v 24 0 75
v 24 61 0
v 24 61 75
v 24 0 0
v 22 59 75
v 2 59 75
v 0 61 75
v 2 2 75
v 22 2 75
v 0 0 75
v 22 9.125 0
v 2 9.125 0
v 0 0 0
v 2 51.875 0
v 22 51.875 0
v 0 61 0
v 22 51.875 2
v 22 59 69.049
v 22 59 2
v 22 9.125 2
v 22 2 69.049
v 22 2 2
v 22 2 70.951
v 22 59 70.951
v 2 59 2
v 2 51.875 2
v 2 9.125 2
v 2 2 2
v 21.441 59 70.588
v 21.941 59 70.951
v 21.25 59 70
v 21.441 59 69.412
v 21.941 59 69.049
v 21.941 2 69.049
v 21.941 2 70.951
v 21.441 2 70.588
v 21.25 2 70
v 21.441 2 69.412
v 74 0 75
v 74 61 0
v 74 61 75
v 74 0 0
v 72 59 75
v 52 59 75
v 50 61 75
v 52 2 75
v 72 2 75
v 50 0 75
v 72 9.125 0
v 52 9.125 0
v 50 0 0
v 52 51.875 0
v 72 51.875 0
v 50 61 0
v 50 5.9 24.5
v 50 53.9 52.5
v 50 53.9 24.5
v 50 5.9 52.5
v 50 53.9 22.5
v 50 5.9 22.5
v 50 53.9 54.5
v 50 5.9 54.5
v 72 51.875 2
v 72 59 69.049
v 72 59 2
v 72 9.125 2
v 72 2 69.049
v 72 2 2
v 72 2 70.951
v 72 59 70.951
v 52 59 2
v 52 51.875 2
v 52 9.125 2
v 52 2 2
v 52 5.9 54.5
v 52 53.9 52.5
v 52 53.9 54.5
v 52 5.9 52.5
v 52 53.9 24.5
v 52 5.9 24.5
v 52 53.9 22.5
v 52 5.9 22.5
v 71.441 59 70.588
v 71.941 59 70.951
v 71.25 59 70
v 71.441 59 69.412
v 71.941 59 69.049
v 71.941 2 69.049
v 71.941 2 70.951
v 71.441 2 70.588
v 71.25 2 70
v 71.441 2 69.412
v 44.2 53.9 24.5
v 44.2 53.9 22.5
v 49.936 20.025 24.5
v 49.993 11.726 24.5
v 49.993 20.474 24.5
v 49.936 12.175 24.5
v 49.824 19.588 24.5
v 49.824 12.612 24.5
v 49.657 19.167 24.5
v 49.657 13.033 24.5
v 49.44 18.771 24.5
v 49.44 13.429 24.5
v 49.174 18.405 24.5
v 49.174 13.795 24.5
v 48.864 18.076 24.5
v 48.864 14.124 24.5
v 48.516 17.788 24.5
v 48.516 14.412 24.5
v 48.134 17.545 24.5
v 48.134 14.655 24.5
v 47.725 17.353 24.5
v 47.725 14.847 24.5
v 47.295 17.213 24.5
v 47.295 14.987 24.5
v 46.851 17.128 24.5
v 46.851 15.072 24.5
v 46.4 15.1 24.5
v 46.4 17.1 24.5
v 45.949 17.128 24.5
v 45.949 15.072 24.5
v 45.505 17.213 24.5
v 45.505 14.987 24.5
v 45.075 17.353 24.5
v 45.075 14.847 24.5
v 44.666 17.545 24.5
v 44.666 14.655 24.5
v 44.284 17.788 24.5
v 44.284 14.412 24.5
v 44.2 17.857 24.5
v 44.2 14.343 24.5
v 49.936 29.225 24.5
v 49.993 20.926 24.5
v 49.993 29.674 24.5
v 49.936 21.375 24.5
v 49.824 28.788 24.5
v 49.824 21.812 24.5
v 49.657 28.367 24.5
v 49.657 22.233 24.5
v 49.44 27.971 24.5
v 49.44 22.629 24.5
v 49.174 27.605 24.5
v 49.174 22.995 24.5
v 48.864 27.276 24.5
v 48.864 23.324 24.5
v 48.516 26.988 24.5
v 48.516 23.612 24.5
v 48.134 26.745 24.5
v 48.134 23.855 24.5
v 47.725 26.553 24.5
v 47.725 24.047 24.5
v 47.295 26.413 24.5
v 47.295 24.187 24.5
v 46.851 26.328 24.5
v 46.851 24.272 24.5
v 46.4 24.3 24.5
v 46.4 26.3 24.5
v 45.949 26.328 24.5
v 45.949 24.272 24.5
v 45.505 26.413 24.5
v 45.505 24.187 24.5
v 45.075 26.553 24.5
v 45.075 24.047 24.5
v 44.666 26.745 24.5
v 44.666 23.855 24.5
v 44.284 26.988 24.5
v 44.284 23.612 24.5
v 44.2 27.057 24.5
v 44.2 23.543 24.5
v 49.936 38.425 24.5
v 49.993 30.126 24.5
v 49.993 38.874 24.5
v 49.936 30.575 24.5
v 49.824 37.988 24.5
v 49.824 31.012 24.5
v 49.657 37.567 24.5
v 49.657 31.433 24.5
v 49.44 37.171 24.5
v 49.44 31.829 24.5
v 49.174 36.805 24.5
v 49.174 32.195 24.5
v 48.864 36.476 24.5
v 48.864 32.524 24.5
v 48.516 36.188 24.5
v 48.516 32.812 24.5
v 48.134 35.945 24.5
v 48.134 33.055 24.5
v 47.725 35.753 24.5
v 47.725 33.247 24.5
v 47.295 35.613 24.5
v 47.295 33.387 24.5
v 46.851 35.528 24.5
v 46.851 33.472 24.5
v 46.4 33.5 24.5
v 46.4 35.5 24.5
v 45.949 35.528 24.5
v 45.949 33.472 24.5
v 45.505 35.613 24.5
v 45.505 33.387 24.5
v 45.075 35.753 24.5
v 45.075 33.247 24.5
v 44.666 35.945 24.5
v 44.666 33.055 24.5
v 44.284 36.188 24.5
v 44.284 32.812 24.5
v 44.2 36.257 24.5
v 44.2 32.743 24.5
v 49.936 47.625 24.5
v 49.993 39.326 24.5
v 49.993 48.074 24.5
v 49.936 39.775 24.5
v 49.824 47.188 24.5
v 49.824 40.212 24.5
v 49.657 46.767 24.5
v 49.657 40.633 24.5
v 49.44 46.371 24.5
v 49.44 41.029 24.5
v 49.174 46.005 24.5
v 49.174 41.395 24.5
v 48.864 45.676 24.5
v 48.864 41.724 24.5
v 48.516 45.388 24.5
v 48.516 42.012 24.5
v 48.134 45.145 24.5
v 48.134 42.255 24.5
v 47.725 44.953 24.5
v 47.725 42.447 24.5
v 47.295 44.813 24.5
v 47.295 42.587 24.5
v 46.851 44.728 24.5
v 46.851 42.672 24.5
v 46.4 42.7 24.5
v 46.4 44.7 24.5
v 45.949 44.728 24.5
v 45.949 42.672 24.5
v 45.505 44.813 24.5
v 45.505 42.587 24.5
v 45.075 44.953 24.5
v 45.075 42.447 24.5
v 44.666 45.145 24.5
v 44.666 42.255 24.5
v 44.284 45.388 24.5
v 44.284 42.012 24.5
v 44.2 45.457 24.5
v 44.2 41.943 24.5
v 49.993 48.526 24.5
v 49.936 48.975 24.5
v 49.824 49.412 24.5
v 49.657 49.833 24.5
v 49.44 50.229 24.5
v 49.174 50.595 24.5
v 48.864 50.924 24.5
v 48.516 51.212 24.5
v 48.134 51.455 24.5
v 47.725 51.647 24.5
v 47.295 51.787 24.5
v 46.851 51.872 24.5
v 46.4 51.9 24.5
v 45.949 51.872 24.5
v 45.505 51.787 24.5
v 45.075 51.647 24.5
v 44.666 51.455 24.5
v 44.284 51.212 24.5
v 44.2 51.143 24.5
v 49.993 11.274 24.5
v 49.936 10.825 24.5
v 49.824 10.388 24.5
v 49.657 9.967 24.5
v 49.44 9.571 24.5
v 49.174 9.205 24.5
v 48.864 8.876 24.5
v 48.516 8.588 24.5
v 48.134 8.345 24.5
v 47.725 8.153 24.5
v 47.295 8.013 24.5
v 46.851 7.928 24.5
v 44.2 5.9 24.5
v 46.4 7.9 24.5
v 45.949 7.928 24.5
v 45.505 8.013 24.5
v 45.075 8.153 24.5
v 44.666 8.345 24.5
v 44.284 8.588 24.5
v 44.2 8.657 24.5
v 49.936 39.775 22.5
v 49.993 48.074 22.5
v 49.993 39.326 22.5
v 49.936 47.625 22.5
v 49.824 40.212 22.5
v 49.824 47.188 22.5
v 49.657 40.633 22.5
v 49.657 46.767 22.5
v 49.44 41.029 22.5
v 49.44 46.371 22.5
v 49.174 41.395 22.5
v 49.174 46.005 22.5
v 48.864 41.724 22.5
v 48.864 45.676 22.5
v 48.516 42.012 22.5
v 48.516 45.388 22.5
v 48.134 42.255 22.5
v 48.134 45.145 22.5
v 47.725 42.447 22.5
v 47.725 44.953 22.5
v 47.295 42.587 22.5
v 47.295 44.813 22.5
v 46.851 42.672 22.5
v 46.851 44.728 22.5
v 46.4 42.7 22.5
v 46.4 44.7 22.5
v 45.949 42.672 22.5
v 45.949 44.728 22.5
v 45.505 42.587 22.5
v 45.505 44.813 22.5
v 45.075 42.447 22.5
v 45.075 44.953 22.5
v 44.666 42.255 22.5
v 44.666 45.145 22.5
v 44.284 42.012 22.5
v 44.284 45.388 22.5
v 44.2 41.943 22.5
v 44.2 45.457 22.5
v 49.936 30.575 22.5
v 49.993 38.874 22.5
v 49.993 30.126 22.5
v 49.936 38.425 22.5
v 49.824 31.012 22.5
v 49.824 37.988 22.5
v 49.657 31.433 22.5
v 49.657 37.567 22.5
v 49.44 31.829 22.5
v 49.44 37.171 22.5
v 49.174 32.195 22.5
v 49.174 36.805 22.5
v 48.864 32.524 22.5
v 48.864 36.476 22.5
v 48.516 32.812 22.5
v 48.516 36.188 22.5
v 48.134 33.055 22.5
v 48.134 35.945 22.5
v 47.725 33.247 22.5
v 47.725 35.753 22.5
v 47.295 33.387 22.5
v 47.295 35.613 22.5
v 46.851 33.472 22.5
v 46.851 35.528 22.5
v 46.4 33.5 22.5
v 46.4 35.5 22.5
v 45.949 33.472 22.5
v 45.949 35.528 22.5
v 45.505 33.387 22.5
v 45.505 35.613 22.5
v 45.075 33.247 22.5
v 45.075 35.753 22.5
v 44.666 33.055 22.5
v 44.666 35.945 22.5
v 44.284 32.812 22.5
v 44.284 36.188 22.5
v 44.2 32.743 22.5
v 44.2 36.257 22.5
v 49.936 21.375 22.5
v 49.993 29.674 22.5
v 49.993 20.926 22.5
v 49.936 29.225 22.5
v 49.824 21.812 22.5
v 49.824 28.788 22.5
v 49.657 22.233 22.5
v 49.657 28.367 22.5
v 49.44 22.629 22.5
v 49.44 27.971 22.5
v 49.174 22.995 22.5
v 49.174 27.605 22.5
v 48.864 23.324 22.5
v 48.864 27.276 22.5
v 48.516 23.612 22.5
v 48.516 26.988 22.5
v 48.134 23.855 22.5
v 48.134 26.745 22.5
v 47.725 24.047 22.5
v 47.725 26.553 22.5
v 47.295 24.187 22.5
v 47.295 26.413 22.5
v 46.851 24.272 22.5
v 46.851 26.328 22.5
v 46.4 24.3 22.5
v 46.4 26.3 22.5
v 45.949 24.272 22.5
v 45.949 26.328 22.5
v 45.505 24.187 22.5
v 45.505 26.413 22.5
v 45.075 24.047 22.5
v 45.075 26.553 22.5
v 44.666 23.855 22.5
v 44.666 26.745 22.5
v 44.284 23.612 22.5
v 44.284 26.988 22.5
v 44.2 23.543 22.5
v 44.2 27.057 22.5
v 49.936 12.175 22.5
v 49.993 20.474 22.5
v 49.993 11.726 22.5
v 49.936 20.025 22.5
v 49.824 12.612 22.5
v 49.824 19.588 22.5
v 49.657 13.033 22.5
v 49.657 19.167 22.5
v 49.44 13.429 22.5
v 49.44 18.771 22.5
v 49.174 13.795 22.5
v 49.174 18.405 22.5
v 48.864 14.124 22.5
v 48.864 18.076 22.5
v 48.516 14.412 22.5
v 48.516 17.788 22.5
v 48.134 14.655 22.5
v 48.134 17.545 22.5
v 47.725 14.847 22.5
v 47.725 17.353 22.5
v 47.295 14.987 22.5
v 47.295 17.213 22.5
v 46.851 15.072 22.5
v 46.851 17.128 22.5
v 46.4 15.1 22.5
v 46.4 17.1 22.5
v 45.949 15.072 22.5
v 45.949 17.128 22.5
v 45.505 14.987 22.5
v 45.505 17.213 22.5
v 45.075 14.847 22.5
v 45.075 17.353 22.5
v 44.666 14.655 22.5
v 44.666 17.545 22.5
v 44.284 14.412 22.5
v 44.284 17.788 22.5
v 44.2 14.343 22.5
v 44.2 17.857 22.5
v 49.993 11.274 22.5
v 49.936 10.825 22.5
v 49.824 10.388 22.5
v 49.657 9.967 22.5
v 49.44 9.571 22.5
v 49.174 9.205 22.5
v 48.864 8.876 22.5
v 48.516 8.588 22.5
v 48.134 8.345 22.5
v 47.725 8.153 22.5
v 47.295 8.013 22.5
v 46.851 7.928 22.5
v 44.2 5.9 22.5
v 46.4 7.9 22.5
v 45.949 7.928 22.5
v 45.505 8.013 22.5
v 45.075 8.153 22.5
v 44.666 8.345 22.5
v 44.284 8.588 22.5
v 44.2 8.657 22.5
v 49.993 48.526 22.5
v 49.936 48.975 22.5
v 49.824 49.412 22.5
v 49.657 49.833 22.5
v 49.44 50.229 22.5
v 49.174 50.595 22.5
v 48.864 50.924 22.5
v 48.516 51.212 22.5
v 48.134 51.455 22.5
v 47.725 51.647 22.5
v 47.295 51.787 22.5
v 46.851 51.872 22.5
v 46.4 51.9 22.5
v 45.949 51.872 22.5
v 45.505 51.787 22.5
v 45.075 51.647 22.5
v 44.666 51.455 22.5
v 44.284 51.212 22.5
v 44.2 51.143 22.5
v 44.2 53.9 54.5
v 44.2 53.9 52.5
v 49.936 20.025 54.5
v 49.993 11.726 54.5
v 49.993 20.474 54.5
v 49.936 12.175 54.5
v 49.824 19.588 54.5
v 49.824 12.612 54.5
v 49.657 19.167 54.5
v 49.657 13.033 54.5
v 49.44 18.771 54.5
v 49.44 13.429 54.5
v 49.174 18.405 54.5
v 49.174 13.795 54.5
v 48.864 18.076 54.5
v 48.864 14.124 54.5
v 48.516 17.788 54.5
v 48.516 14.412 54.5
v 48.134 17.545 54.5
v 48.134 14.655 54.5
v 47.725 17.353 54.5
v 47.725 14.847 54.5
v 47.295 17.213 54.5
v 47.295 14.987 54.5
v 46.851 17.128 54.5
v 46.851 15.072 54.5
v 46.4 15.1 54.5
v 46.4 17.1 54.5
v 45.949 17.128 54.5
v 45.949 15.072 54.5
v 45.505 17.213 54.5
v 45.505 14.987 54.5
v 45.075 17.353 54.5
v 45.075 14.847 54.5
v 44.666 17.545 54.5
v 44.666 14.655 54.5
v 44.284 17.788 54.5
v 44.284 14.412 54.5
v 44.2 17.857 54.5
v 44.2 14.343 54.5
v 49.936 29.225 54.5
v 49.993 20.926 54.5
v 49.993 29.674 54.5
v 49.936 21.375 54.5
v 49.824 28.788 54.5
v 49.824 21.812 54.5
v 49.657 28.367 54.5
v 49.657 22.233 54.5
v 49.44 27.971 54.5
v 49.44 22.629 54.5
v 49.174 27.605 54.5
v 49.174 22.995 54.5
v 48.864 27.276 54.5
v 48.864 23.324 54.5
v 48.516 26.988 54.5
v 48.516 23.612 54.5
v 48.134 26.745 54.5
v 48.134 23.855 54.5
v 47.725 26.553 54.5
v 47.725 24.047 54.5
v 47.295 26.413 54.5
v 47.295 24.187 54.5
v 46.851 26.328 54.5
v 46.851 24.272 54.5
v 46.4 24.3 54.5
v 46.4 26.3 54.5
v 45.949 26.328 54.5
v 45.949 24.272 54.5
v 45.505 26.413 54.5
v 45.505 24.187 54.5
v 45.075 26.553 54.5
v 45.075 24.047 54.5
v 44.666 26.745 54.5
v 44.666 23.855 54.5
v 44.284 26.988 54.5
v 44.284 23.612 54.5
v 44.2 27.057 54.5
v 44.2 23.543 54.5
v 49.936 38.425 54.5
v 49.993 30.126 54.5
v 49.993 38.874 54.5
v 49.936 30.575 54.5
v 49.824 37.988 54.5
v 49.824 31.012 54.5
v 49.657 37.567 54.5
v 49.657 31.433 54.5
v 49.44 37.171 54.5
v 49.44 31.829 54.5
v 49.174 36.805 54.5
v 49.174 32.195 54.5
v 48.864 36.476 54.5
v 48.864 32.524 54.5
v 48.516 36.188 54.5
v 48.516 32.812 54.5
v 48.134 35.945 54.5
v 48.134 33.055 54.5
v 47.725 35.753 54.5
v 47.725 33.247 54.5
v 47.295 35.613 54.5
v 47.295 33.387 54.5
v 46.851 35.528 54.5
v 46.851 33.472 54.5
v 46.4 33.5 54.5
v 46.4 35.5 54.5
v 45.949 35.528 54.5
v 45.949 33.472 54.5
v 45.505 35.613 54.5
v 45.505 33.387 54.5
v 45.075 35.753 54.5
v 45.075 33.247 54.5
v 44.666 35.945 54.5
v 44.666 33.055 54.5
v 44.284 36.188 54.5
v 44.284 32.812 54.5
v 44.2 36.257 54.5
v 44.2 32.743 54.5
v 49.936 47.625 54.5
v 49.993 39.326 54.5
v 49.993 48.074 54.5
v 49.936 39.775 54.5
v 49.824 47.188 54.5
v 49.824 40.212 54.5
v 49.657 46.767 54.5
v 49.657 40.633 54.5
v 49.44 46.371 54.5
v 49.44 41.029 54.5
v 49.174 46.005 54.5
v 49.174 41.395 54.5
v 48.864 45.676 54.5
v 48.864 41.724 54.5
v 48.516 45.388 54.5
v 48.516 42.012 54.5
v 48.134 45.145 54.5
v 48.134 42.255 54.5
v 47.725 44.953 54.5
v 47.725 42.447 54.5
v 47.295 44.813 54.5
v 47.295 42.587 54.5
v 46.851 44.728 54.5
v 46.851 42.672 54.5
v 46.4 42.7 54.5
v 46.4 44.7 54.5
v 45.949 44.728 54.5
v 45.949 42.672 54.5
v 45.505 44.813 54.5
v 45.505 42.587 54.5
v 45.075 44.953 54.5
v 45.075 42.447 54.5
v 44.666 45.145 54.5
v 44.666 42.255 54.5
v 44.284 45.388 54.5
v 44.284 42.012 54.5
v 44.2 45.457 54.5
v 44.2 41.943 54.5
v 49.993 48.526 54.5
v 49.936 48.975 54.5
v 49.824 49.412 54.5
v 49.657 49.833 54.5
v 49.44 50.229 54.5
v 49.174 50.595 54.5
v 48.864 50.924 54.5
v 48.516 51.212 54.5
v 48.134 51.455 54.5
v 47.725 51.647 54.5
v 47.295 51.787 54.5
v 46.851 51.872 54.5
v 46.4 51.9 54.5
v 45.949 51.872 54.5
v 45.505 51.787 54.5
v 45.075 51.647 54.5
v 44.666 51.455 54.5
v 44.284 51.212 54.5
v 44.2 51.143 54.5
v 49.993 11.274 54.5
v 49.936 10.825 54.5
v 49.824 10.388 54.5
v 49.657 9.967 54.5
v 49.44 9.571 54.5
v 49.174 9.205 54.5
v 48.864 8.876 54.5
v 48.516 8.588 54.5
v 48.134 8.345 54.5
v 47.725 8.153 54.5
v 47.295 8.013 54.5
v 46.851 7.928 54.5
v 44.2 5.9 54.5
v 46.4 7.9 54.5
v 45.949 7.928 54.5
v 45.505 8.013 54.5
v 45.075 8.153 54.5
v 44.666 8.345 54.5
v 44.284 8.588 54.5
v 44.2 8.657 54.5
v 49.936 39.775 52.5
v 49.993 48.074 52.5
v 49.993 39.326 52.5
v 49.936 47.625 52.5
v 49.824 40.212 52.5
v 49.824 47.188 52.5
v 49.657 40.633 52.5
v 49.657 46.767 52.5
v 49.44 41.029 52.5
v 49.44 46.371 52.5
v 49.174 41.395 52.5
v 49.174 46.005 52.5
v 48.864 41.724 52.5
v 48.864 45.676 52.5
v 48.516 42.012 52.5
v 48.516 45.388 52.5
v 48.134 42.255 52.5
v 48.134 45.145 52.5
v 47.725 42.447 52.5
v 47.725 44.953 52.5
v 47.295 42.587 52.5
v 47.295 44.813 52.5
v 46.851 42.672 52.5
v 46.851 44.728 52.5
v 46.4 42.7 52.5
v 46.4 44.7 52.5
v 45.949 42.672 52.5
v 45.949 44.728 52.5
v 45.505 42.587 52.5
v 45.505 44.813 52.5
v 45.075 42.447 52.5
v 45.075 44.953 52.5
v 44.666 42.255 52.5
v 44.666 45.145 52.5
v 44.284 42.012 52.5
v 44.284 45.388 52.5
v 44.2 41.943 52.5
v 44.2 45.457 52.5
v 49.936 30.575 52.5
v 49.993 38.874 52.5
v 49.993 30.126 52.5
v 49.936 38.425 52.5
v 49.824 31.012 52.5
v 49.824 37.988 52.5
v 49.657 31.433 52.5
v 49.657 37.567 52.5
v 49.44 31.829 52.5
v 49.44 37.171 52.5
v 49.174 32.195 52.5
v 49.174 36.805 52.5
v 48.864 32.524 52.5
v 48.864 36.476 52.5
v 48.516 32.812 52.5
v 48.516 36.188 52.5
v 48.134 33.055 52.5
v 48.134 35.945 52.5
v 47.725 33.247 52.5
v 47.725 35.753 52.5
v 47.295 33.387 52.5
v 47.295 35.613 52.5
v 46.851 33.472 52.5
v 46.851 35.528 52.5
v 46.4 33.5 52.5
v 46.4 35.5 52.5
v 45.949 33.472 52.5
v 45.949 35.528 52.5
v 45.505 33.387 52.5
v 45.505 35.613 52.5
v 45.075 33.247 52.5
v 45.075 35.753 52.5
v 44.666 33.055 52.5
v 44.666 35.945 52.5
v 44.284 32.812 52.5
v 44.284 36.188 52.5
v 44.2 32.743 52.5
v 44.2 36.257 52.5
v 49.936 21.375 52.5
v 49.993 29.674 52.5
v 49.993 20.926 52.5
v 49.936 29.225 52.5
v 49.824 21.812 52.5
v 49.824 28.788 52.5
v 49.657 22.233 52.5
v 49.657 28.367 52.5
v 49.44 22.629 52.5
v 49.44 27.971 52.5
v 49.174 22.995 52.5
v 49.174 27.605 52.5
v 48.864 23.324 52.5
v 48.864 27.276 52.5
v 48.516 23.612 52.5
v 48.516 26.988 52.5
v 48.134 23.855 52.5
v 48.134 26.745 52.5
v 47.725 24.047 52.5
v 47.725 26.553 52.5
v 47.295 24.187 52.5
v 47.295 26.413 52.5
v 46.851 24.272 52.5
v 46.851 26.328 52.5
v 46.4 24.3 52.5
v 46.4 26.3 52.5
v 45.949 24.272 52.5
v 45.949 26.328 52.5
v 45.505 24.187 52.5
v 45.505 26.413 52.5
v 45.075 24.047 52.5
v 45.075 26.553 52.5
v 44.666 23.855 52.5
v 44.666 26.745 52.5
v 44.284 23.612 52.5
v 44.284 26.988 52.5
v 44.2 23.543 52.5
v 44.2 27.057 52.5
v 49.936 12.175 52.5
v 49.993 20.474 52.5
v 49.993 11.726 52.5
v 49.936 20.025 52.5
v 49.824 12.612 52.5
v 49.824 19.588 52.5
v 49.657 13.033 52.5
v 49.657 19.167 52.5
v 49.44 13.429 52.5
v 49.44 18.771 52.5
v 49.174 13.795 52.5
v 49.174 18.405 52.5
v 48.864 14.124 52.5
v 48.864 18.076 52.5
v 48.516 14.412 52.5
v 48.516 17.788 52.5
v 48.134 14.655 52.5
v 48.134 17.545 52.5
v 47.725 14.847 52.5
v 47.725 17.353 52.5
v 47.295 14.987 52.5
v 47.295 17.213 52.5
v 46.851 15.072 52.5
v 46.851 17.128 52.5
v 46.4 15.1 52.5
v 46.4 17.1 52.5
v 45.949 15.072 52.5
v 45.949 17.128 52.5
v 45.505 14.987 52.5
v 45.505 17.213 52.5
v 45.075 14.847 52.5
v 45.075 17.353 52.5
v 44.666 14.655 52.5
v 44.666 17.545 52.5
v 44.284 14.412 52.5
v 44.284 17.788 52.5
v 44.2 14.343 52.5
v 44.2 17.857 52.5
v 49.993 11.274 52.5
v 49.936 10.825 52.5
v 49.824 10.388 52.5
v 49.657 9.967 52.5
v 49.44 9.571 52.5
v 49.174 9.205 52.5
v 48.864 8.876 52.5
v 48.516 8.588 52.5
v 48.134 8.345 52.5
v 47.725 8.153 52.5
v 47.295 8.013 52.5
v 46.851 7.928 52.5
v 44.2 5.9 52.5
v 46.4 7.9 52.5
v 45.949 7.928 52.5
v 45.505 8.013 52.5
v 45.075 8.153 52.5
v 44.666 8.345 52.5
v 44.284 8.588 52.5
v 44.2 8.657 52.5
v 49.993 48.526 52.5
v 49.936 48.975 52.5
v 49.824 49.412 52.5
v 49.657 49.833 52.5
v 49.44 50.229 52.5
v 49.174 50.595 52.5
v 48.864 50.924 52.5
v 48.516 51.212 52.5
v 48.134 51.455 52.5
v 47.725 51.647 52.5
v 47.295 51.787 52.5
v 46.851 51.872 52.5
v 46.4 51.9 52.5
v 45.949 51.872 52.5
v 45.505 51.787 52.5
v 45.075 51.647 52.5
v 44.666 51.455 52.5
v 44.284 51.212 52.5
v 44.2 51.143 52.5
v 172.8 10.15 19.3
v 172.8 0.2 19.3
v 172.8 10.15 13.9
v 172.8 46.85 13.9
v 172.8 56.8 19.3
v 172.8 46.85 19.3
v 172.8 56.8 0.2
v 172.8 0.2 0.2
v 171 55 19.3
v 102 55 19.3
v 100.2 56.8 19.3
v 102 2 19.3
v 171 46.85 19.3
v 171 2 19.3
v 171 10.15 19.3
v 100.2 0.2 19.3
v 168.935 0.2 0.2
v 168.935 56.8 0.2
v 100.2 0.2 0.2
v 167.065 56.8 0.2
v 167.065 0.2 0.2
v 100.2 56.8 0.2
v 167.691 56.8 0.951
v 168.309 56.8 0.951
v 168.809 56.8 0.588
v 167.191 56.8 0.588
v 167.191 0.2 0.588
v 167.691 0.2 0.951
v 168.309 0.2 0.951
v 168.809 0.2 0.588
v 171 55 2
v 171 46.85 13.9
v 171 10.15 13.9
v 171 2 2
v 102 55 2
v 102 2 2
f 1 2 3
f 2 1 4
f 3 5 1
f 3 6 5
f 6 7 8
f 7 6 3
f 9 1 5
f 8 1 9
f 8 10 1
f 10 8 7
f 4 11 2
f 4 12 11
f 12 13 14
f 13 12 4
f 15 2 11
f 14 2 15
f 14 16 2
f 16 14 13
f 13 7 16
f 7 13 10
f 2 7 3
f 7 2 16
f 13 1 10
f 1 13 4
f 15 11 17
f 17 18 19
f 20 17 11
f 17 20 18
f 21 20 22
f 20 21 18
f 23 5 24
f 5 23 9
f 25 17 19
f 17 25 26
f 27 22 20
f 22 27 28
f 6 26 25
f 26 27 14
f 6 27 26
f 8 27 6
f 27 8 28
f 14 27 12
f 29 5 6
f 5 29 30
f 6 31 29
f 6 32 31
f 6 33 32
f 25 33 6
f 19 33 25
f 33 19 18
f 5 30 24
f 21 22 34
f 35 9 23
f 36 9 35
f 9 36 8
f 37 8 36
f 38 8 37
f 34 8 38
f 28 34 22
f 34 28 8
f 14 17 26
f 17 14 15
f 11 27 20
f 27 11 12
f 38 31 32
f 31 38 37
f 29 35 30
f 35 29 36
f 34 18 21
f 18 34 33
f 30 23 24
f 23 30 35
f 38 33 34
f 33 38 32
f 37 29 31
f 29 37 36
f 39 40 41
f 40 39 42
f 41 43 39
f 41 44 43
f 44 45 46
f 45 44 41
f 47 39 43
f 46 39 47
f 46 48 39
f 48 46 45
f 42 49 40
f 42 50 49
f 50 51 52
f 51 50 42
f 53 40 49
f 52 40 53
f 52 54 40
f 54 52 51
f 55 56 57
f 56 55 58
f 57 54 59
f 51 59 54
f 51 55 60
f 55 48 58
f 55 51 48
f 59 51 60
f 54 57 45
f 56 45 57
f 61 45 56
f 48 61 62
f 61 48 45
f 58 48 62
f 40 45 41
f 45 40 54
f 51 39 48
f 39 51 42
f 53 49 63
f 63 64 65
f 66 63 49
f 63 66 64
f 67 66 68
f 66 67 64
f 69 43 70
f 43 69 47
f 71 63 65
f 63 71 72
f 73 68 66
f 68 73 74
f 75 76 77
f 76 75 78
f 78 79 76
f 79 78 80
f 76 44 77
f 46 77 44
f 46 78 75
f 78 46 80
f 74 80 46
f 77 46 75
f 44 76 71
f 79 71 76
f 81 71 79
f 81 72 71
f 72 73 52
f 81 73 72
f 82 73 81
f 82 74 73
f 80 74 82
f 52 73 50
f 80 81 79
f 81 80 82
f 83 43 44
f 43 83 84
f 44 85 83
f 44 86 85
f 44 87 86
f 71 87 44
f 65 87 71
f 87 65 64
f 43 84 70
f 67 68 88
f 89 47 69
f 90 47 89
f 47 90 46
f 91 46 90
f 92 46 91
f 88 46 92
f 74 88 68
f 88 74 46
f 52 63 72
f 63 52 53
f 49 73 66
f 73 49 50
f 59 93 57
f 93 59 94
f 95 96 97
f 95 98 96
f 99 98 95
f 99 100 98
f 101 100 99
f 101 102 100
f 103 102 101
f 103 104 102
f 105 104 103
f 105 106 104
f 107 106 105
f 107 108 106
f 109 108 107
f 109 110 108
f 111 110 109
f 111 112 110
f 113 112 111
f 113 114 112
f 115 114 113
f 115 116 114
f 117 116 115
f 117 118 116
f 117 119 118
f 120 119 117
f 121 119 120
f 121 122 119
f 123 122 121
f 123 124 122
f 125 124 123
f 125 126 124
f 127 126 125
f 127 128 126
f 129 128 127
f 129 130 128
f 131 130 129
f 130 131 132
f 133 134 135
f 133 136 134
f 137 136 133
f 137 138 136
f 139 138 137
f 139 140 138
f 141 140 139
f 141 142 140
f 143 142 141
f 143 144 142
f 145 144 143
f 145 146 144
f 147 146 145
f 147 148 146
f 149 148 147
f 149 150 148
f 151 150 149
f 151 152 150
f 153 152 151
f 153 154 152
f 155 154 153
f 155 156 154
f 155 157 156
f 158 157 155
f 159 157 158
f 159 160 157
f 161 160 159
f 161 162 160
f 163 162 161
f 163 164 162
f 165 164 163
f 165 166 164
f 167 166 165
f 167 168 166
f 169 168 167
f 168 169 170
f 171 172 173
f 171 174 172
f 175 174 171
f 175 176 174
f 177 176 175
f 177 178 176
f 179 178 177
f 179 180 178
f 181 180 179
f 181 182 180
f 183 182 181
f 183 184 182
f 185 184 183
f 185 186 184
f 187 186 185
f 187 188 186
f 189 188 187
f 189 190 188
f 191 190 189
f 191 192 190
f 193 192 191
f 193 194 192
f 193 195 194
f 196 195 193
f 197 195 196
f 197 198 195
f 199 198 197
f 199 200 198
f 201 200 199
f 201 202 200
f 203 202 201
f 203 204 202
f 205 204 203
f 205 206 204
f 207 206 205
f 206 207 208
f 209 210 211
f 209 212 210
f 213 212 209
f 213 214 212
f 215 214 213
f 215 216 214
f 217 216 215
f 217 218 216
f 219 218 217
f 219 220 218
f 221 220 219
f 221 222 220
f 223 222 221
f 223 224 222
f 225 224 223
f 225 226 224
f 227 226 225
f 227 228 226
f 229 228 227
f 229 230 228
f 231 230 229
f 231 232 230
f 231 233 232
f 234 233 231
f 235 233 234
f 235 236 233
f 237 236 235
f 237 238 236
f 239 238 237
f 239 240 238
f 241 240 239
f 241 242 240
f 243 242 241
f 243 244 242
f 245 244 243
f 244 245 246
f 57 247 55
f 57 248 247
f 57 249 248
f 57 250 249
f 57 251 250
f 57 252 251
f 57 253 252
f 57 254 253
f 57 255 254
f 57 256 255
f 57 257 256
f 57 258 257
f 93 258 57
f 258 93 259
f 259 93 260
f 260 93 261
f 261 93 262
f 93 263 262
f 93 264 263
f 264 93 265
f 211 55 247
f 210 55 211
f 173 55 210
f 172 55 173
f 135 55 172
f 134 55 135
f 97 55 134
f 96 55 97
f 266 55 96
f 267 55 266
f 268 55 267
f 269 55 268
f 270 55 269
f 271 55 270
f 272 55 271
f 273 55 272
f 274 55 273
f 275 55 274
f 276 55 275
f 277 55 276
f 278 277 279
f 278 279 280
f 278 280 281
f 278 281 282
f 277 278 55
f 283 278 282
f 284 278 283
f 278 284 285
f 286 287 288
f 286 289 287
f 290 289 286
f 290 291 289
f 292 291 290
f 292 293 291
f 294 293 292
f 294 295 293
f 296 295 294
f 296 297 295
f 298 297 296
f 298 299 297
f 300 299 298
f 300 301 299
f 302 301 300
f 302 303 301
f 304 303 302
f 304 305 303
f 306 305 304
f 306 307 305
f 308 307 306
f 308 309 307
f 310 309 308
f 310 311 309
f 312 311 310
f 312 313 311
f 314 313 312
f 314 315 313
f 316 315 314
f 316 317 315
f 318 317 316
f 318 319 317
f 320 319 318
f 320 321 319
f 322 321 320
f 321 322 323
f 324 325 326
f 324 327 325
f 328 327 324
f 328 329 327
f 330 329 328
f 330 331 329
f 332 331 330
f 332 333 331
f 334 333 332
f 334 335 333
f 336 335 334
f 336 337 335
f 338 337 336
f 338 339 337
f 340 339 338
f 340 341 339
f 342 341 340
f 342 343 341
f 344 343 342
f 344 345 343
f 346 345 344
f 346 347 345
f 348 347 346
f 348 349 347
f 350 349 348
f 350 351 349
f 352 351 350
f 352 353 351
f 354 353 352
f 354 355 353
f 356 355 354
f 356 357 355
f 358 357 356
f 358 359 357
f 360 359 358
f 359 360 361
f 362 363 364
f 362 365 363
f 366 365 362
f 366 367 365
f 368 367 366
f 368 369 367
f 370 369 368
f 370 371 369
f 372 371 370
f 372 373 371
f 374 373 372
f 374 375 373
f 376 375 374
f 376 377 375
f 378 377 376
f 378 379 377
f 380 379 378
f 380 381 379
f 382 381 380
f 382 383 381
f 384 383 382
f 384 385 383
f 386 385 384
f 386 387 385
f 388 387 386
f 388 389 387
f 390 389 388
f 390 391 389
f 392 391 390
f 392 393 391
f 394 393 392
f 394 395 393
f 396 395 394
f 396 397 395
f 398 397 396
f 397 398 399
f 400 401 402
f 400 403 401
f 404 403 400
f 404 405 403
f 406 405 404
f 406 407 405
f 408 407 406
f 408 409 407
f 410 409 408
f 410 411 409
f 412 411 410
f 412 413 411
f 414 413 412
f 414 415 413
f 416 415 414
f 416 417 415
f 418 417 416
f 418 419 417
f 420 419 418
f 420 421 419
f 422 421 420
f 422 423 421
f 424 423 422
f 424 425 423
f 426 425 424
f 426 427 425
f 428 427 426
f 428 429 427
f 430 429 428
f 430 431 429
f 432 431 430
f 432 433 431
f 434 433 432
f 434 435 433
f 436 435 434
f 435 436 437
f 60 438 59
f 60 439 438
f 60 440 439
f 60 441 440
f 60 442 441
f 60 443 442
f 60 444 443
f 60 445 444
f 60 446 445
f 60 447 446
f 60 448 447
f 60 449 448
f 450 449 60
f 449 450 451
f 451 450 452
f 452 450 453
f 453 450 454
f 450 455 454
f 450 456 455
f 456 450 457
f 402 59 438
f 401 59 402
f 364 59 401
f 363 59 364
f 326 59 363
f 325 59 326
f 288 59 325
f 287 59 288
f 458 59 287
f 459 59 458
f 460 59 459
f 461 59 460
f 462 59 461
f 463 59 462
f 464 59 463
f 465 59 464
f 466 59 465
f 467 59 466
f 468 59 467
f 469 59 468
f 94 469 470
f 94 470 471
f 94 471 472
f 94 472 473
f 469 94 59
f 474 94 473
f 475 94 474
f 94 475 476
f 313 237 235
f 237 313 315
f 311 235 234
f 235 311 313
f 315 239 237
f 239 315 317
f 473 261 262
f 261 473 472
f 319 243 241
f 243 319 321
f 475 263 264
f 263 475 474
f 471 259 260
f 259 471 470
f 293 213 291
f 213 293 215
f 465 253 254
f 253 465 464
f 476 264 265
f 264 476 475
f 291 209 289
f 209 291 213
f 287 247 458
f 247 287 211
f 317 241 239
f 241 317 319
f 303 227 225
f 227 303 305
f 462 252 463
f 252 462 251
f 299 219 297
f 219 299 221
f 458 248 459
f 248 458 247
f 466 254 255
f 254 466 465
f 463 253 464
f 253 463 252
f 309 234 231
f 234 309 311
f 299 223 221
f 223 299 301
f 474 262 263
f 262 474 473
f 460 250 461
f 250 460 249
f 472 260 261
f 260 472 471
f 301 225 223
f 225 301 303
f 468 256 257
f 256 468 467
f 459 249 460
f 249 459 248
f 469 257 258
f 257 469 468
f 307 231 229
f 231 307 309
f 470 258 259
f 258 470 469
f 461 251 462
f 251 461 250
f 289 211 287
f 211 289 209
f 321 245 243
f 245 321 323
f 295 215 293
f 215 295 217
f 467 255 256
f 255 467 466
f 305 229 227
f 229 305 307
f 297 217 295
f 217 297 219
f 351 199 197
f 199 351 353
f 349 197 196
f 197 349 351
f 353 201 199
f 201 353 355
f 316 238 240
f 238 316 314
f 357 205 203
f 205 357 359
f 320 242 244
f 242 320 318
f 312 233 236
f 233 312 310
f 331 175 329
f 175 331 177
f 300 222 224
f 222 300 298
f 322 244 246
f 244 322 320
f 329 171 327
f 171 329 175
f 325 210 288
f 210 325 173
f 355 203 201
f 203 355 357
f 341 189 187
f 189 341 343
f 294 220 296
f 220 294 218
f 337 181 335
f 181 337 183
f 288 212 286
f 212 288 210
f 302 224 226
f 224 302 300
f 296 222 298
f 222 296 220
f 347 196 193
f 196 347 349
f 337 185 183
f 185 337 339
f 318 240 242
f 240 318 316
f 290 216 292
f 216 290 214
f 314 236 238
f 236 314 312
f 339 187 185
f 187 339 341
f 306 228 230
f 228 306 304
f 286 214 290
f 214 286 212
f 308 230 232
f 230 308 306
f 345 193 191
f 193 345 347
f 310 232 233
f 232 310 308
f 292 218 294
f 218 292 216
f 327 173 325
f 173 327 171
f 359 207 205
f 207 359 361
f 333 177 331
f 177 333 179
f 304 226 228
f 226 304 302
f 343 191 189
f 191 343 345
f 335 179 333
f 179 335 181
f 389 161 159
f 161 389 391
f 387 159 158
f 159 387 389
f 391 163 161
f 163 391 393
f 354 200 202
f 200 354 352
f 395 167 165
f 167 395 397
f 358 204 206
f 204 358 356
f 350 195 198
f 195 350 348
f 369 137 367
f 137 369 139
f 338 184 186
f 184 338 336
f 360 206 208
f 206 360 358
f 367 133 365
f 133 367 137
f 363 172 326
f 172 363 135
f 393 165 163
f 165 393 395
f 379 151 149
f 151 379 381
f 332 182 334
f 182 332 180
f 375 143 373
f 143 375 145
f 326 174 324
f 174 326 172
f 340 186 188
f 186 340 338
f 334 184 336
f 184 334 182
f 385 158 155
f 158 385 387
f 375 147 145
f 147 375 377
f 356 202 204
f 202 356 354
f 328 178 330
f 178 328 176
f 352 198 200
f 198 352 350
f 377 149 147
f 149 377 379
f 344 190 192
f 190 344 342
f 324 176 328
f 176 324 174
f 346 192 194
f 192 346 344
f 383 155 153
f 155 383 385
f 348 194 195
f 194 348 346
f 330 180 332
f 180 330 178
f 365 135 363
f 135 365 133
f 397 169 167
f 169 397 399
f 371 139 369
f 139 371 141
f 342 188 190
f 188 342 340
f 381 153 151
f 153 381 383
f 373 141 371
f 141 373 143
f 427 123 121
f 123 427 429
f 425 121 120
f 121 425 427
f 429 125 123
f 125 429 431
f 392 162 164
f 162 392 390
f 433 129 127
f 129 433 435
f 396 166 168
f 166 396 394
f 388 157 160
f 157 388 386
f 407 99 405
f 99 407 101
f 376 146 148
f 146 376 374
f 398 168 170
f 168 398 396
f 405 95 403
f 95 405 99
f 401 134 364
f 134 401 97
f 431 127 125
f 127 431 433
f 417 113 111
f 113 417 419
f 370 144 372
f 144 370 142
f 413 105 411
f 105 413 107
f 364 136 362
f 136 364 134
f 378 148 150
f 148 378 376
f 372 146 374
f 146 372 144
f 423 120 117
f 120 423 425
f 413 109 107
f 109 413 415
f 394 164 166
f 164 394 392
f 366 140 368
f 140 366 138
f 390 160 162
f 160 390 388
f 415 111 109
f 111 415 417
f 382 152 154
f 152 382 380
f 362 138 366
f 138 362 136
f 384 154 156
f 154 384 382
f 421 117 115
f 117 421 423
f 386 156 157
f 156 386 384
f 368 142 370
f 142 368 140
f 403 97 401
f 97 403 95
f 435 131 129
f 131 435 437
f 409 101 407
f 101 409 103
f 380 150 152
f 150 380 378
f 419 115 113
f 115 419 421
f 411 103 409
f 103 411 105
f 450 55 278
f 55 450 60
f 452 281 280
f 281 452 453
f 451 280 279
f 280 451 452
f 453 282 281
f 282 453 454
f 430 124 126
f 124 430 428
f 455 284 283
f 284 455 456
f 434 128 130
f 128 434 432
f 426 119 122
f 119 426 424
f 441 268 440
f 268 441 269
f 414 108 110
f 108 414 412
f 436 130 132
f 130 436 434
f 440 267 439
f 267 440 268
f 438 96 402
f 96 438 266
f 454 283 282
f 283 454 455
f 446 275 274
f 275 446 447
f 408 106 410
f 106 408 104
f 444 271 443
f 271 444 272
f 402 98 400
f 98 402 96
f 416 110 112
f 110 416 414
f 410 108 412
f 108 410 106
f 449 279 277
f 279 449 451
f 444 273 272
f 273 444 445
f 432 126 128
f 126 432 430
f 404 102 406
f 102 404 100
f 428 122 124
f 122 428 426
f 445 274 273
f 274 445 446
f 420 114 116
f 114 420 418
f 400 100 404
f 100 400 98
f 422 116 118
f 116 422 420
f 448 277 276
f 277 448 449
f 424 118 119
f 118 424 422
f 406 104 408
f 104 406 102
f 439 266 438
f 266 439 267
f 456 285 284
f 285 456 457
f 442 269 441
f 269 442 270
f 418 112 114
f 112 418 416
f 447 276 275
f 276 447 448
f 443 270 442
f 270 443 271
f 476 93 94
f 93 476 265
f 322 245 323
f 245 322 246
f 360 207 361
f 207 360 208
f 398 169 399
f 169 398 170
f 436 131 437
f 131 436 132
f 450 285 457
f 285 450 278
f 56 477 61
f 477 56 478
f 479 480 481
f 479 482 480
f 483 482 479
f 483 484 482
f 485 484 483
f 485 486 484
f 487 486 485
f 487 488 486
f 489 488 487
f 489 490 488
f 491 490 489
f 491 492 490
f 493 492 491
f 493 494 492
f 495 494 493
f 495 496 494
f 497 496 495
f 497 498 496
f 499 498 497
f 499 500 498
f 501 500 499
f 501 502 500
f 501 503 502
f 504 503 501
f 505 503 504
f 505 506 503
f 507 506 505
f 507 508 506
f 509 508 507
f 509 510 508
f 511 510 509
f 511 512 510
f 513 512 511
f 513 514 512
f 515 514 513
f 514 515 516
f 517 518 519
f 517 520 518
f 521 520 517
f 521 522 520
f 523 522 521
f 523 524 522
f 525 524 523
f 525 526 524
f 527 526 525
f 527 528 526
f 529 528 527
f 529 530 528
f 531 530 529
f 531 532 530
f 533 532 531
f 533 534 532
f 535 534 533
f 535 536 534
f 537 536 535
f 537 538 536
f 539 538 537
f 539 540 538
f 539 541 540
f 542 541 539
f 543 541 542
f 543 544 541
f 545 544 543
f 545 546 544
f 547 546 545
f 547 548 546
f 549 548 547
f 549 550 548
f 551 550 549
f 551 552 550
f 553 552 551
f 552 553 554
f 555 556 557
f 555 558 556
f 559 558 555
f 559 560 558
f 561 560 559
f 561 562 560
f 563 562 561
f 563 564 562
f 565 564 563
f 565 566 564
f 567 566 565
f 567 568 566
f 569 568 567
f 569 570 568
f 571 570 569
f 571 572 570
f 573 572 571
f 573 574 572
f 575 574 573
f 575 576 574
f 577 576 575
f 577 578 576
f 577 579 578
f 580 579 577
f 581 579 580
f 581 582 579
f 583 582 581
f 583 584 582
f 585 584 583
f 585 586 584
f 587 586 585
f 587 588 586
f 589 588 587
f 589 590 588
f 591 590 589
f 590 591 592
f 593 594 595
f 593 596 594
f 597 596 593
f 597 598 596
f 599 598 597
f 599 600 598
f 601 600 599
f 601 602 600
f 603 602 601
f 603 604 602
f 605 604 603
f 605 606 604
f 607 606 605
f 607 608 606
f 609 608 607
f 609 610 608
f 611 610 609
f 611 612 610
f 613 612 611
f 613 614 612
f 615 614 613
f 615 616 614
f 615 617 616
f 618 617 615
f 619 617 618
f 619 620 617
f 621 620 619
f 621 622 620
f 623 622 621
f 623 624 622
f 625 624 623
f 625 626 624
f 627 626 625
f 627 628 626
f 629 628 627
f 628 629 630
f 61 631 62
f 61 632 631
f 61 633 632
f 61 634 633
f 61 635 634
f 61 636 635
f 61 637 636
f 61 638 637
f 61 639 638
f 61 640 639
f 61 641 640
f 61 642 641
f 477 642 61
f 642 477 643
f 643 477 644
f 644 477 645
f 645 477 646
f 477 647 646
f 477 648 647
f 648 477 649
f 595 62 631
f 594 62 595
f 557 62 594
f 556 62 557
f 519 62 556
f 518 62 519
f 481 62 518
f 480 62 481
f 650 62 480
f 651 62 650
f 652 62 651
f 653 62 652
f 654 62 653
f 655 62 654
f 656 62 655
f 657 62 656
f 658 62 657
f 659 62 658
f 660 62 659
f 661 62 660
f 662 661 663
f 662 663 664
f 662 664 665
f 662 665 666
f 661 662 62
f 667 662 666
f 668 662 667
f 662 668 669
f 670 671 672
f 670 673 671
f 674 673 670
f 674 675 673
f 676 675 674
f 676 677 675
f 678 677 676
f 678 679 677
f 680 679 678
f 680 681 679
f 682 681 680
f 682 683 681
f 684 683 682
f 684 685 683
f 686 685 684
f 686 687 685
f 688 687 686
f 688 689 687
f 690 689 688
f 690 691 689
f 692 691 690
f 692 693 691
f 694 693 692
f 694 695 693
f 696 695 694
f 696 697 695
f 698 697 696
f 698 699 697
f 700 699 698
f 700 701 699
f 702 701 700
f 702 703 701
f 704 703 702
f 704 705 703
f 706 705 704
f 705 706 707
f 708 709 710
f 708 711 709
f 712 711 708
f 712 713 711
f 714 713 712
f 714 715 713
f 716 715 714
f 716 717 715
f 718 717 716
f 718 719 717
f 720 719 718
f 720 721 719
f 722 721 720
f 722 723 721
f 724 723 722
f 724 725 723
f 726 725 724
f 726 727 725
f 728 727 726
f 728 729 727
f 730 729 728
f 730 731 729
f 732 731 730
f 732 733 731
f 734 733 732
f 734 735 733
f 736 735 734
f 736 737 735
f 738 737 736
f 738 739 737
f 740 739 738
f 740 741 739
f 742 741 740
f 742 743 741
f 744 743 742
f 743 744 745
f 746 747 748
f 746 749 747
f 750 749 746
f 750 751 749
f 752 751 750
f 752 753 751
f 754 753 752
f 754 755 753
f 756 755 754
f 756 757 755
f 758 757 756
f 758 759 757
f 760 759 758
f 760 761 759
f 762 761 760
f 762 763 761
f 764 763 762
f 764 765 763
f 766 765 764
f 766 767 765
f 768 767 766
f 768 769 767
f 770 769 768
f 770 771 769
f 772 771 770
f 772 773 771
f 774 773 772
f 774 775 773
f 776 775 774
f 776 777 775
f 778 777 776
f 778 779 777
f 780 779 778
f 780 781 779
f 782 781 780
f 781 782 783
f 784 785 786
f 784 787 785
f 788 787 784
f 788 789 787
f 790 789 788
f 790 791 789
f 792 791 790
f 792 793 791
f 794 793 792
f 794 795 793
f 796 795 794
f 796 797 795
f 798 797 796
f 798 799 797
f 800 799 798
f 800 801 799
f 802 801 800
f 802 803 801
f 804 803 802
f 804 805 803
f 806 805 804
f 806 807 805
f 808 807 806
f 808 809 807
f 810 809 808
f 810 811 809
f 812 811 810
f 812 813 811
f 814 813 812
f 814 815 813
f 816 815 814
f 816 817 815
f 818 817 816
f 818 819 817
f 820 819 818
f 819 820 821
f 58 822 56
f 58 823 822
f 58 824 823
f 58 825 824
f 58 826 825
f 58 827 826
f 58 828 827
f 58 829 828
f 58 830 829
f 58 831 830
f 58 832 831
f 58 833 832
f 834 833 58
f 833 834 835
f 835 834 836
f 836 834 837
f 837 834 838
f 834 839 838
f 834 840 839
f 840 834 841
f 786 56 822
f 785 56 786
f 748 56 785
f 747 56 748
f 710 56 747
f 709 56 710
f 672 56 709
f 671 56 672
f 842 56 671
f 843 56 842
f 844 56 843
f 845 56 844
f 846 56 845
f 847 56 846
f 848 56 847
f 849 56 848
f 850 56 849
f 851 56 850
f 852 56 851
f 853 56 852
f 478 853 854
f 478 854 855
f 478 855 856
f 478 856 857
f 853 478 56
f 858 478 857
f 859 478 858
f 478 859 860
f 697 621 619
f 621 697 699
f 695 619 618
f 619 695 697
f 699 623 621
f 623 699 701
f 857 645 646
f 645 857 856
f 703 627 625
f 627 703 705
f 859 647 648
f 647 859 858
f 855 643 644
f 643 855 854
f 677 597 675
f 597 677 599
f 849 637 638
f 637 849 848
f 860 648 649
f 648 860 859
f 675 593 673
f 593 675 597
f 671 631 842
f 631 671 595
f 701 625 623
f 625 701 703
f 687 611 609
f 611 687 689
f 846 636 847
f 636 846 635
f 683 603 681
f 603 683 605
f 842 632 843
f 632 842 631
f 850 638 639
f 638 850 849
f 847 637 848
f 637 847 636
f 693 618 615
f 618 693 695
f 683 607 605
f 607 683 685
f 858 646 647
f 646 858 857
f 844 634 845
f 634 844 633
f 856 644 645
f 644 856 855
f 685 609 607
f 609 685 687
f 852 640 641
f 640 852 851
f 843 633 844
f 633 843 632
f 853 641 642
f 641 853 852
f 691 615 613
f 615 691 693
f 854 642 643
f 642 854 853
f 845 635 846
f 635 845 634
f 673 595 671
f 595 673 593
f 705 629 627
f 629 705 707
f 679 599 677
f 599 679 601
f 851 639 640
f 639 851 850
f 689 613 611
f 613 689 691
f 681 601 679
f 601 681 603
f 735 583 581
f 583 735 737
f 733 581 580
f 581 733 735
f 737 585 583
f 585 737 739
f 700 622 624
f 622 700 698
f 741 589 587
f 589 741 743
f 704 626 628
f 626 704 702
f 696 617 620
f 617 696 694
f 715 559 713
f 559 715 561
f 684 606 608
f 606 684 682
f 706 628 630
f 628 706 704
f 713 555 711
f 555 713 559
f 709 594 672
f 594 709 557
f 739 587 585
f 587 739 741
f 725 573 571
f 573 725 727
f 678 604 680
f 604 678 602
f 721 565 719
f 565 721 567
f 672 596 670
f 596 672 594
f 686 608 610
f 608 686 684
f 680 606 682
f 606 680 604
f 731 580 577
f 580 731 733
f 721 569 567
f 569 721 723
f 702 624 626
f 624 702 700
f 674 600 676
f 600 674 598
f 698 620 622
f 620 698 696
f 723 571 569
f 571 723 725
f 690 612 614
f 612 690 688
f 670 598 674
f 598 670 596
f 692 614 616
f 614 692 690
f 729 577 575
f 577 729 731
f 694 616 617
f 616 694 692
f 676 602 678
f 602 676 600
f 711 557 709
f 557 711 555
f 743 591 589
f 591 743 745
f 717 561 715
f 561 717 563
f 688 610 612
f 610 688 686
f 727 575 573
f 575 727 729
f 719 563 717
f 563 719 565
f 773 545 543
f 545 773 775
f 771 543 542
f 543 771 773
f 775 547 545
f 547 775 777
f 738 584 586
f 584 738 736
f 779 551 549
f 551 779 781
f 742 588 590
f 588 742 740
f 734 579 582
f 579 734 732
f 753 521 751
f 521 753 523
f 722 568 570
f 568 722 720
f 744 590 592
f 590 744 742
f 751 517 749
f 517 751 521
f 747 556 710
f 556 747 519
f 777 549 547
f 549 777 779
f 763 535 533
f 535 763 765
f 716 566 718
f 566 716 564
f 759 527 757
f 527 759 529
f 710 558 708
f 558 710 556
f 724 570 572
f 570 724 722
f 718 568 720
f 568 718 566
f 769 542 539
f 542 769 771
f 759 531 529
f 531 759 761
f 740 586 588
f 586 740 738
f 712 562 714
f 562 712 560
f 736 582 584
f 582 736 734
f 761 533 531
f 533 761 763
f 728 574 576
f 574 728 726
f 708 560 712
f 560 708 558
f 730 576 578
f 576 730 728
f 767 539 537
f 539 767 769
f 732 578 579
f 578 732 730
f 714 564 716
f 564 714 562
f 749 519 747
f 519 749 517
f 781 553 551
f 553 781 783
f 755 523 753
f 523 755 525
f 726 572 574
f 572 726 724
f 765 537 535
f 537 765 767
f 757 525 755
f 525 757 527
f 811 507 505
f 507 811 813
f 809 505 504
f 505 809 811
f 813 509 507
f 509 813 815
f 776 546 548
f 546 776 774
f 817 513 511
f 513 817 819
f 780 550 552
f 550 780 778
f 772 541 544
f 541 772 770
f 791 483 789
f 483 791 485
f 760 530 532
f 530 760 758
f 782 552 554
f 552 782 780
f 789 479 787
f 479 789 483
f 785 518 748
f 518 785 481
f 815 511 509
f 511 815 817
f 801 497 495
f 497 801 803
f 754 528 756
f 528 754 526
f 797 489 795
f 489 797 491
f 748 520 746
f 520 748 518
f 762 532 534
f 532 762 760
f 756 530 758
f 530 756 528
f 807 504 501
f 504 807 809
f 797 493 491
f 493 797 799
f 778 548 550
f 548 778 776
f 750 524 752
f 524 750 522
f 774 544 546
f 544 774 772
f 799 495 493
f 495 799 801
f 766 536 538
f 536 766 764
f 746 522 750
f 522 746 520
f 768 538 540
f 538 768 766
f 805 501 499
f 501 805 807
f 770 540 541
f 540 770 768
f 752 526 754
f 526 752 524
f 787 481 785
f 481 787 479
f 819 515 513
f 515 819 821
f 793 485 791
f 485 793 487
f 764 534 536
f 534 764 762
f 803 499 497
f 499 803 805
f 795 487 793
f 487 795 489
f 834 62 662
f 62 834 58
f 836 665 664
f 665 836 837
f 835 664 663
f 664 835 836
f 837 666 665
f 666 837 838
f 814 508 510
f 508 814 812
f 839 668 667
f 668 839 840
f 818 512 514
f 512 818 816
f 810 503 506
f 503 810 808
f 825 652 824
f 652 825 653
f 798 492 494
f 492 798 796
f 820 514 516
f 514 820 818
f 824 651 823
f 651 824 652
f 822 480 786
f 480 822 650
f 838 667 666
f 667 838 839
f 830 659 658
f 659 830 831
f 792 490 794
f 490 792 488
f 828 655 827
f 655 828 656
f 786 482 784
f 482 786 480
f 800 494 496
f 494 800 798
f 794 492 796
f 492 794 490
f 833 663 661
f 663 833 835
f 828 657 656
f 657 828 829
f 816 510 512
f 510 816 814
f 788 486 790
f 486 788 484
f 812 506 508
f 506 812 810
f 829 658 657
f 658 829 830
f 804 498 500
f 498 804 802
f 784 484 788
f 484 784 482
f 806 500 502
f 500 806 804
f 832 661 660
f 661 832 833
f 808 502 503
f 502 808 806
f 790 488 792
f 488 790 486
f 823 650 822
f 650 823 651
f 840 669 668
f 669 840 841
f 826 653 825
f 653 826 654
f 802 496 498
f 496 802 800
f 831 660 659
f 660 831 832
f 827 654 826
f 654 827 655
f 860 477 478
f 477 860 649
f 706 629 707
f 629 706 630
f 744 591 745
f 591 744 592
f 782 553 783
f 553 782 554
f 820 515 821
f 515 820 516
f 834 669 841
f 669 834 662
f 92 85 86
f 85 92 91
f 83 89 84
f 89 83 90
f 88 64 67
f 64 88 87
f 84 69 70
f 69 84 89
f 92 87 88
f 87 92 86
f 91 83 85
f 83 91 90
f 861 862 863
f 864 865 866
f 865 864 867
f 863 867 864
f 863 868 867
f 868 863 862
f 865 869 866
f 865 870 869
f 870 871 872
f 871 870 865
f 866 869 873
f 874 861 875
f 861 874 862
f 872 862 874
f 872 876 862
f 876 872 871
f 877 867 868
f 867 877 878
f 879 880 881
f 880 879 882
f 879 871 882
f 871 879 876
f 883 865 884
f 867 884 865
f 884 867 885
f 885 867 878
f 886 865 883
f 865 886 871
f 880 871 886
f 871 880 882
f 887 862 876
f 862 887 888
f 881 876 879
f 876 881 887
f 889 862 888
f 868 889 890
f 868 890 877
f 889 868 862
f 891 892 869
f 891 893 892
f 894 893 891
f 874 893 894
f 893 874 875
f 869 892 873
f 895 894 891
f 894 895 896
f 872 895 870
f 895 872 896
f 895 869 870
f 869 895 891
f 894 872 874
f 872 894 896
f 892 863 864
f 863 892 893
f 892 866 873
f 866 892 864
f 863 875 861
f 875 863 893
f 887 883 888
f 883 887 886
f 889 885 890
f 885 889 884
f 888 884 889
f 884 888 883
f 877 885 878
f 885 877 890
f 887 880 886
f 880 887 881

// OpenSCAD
// file: lamy-t10.scad
// Clip for holding five LAMY T10 ink cartridges (https://www.lamy.com/en-us/p/lamy-t-10-ink/50727869088078)

cart_r = 7.2 / 2;

wall_thicc = 2;

$fn=50;

clip_width = cart_r * 2 + wall_thicc * 2;

module clip() {
    difference() {
        cube([clip_width, wall_thicc, clip_width]);
        translate([cart_r + wall_thicc, 5, cart_r + wall_thicc])
            rotate([90, 0, 0])
            cylinder(10, cart_r, cart_r);
    }
}

function comb_width() = clip_width * 4 + wall_thicc;

module comb() {
    difference() {
        union() {
            for (i = [0:4]) {
                translate([i * (clip_width - wall_thicc), 0, 0])
                    clip();
            }
        }
        translate([-clip_width / 2 + wall_thicc, -wall_thicc / 2, clip_width - 3.4])
            cube([clip_width * 6, wall_thicc * 2, clip_width]);
    }
}

union() {
    for (i = [0:5]) {
        translate([i * (clip_width - wall_thicc), 0, 0])
            cube([wall_thicc, 30, wall_thicc]);
    }
    cube([comb_width(), 30, 1]);
    comb();
    translate([0, 30, 0]) comb();
}
// main file
// A small box designed hold some ink cartridges

use <./lamy-t10.scad>;

interior_x = 20;
interior_y = 57;
interior_z = 73;

wall_thicc = 2;

case_x = interior_x + wall_thicc*2;
case_y = interior_y + wall_thicc*2;
case_z = interior_z + wall_thicc*1;

bump_inset = 5;

$fn = 10;

// case
union() {
    difference() {
        cube([case_x, case_y, case_z]);

        // interior
        translate([wall_thicc, wall_thicc, wall_thicc])
            cube([interior_x, interior_y, interior_z + .1]);

        // thumb hole
        translate([wall_thicc, wall_thicc + interior_y/2 - (interior_y*.75/2), -5])
            cube([interior_x, interior_y*.75, 10]);
    }

    // bump
    translate([interior_x + wall_thicc + .25, wall_thicc, interior_z + wall_thicc - bump_inset])
        rotate([-90, 0, 0])
        cylinder(interior_y, 1);
}

// case with lamy t10 clip
translate([50, 0, 0])
union() {
    translate([wall_thicc, case_y/2 + comb_width()/2, case_z/2 - 15])
        rotate([90, 0, -90])
        comb();

    translate([wall_thicc, case_y/2 + comb_width()/2, case_z/2 + 15])
        rotate([90, 0, -90])
        comb();

    difference() {
        cube([case_x, case_y, case_z]);

        // interior
        translate([wall_thicc, wall_thicc, wall_thicc])
            cube([interior_x, interior_y, interior_z + .1]);

        // thumb hole
        translate([wall_thicc, wall_thicc + interior_y/2 - (interior_y*.75/2), -5])
            cube([interior_x, interior_y*.75, 10]);
    }

    // bump
    translate([interior_x + wall_thicc + .25, wall_thicc, interior_z + wall_thicc - bump_inset])
        rotate([-90, 0, 0])
        cylinder(interior_y, 1);
}

// drawer
translate([100, 0, 0]) {
    difference() {
        tolerance = .4;
        translate([tolerance / 2, tolerance / 2, tolerance / 2])
            cube([interior_z - tolerance, interior_y - tolerance, interior_x - tolerance - .5]);

        // interior
        translate([wall_thicc, wall_thicc, wall_thicc])
            cube([interior_z - wall_thicc*2, interior_y - wall_thicc*2, interior_x - wall_thicc + 2]);

        // thumb cutout
        cutout_size = interior_z/2;
        translate([interior_z - wall_thicc - .1, interior_y / 2 - cutout_size/2 - .1, interior_x-wall_thicc*3 - .1])
            cube([wall_thicc + .2, cutout_size + .2, wall_thicc*3 + .2]);

        // bump cutout
        translate([interior_z - bump_inset, -.1, 0])
            rotate([-90, 0, 0])
            cylinder(interior_y + .2, 1);
    }
}

// // cartridge
// translate([60, wall_thicc + .1, 10])
//     rotate([-90, 0, 0])
//     %cylinder(52.5, 7 / 2, 7 / 2, $fn=80);
